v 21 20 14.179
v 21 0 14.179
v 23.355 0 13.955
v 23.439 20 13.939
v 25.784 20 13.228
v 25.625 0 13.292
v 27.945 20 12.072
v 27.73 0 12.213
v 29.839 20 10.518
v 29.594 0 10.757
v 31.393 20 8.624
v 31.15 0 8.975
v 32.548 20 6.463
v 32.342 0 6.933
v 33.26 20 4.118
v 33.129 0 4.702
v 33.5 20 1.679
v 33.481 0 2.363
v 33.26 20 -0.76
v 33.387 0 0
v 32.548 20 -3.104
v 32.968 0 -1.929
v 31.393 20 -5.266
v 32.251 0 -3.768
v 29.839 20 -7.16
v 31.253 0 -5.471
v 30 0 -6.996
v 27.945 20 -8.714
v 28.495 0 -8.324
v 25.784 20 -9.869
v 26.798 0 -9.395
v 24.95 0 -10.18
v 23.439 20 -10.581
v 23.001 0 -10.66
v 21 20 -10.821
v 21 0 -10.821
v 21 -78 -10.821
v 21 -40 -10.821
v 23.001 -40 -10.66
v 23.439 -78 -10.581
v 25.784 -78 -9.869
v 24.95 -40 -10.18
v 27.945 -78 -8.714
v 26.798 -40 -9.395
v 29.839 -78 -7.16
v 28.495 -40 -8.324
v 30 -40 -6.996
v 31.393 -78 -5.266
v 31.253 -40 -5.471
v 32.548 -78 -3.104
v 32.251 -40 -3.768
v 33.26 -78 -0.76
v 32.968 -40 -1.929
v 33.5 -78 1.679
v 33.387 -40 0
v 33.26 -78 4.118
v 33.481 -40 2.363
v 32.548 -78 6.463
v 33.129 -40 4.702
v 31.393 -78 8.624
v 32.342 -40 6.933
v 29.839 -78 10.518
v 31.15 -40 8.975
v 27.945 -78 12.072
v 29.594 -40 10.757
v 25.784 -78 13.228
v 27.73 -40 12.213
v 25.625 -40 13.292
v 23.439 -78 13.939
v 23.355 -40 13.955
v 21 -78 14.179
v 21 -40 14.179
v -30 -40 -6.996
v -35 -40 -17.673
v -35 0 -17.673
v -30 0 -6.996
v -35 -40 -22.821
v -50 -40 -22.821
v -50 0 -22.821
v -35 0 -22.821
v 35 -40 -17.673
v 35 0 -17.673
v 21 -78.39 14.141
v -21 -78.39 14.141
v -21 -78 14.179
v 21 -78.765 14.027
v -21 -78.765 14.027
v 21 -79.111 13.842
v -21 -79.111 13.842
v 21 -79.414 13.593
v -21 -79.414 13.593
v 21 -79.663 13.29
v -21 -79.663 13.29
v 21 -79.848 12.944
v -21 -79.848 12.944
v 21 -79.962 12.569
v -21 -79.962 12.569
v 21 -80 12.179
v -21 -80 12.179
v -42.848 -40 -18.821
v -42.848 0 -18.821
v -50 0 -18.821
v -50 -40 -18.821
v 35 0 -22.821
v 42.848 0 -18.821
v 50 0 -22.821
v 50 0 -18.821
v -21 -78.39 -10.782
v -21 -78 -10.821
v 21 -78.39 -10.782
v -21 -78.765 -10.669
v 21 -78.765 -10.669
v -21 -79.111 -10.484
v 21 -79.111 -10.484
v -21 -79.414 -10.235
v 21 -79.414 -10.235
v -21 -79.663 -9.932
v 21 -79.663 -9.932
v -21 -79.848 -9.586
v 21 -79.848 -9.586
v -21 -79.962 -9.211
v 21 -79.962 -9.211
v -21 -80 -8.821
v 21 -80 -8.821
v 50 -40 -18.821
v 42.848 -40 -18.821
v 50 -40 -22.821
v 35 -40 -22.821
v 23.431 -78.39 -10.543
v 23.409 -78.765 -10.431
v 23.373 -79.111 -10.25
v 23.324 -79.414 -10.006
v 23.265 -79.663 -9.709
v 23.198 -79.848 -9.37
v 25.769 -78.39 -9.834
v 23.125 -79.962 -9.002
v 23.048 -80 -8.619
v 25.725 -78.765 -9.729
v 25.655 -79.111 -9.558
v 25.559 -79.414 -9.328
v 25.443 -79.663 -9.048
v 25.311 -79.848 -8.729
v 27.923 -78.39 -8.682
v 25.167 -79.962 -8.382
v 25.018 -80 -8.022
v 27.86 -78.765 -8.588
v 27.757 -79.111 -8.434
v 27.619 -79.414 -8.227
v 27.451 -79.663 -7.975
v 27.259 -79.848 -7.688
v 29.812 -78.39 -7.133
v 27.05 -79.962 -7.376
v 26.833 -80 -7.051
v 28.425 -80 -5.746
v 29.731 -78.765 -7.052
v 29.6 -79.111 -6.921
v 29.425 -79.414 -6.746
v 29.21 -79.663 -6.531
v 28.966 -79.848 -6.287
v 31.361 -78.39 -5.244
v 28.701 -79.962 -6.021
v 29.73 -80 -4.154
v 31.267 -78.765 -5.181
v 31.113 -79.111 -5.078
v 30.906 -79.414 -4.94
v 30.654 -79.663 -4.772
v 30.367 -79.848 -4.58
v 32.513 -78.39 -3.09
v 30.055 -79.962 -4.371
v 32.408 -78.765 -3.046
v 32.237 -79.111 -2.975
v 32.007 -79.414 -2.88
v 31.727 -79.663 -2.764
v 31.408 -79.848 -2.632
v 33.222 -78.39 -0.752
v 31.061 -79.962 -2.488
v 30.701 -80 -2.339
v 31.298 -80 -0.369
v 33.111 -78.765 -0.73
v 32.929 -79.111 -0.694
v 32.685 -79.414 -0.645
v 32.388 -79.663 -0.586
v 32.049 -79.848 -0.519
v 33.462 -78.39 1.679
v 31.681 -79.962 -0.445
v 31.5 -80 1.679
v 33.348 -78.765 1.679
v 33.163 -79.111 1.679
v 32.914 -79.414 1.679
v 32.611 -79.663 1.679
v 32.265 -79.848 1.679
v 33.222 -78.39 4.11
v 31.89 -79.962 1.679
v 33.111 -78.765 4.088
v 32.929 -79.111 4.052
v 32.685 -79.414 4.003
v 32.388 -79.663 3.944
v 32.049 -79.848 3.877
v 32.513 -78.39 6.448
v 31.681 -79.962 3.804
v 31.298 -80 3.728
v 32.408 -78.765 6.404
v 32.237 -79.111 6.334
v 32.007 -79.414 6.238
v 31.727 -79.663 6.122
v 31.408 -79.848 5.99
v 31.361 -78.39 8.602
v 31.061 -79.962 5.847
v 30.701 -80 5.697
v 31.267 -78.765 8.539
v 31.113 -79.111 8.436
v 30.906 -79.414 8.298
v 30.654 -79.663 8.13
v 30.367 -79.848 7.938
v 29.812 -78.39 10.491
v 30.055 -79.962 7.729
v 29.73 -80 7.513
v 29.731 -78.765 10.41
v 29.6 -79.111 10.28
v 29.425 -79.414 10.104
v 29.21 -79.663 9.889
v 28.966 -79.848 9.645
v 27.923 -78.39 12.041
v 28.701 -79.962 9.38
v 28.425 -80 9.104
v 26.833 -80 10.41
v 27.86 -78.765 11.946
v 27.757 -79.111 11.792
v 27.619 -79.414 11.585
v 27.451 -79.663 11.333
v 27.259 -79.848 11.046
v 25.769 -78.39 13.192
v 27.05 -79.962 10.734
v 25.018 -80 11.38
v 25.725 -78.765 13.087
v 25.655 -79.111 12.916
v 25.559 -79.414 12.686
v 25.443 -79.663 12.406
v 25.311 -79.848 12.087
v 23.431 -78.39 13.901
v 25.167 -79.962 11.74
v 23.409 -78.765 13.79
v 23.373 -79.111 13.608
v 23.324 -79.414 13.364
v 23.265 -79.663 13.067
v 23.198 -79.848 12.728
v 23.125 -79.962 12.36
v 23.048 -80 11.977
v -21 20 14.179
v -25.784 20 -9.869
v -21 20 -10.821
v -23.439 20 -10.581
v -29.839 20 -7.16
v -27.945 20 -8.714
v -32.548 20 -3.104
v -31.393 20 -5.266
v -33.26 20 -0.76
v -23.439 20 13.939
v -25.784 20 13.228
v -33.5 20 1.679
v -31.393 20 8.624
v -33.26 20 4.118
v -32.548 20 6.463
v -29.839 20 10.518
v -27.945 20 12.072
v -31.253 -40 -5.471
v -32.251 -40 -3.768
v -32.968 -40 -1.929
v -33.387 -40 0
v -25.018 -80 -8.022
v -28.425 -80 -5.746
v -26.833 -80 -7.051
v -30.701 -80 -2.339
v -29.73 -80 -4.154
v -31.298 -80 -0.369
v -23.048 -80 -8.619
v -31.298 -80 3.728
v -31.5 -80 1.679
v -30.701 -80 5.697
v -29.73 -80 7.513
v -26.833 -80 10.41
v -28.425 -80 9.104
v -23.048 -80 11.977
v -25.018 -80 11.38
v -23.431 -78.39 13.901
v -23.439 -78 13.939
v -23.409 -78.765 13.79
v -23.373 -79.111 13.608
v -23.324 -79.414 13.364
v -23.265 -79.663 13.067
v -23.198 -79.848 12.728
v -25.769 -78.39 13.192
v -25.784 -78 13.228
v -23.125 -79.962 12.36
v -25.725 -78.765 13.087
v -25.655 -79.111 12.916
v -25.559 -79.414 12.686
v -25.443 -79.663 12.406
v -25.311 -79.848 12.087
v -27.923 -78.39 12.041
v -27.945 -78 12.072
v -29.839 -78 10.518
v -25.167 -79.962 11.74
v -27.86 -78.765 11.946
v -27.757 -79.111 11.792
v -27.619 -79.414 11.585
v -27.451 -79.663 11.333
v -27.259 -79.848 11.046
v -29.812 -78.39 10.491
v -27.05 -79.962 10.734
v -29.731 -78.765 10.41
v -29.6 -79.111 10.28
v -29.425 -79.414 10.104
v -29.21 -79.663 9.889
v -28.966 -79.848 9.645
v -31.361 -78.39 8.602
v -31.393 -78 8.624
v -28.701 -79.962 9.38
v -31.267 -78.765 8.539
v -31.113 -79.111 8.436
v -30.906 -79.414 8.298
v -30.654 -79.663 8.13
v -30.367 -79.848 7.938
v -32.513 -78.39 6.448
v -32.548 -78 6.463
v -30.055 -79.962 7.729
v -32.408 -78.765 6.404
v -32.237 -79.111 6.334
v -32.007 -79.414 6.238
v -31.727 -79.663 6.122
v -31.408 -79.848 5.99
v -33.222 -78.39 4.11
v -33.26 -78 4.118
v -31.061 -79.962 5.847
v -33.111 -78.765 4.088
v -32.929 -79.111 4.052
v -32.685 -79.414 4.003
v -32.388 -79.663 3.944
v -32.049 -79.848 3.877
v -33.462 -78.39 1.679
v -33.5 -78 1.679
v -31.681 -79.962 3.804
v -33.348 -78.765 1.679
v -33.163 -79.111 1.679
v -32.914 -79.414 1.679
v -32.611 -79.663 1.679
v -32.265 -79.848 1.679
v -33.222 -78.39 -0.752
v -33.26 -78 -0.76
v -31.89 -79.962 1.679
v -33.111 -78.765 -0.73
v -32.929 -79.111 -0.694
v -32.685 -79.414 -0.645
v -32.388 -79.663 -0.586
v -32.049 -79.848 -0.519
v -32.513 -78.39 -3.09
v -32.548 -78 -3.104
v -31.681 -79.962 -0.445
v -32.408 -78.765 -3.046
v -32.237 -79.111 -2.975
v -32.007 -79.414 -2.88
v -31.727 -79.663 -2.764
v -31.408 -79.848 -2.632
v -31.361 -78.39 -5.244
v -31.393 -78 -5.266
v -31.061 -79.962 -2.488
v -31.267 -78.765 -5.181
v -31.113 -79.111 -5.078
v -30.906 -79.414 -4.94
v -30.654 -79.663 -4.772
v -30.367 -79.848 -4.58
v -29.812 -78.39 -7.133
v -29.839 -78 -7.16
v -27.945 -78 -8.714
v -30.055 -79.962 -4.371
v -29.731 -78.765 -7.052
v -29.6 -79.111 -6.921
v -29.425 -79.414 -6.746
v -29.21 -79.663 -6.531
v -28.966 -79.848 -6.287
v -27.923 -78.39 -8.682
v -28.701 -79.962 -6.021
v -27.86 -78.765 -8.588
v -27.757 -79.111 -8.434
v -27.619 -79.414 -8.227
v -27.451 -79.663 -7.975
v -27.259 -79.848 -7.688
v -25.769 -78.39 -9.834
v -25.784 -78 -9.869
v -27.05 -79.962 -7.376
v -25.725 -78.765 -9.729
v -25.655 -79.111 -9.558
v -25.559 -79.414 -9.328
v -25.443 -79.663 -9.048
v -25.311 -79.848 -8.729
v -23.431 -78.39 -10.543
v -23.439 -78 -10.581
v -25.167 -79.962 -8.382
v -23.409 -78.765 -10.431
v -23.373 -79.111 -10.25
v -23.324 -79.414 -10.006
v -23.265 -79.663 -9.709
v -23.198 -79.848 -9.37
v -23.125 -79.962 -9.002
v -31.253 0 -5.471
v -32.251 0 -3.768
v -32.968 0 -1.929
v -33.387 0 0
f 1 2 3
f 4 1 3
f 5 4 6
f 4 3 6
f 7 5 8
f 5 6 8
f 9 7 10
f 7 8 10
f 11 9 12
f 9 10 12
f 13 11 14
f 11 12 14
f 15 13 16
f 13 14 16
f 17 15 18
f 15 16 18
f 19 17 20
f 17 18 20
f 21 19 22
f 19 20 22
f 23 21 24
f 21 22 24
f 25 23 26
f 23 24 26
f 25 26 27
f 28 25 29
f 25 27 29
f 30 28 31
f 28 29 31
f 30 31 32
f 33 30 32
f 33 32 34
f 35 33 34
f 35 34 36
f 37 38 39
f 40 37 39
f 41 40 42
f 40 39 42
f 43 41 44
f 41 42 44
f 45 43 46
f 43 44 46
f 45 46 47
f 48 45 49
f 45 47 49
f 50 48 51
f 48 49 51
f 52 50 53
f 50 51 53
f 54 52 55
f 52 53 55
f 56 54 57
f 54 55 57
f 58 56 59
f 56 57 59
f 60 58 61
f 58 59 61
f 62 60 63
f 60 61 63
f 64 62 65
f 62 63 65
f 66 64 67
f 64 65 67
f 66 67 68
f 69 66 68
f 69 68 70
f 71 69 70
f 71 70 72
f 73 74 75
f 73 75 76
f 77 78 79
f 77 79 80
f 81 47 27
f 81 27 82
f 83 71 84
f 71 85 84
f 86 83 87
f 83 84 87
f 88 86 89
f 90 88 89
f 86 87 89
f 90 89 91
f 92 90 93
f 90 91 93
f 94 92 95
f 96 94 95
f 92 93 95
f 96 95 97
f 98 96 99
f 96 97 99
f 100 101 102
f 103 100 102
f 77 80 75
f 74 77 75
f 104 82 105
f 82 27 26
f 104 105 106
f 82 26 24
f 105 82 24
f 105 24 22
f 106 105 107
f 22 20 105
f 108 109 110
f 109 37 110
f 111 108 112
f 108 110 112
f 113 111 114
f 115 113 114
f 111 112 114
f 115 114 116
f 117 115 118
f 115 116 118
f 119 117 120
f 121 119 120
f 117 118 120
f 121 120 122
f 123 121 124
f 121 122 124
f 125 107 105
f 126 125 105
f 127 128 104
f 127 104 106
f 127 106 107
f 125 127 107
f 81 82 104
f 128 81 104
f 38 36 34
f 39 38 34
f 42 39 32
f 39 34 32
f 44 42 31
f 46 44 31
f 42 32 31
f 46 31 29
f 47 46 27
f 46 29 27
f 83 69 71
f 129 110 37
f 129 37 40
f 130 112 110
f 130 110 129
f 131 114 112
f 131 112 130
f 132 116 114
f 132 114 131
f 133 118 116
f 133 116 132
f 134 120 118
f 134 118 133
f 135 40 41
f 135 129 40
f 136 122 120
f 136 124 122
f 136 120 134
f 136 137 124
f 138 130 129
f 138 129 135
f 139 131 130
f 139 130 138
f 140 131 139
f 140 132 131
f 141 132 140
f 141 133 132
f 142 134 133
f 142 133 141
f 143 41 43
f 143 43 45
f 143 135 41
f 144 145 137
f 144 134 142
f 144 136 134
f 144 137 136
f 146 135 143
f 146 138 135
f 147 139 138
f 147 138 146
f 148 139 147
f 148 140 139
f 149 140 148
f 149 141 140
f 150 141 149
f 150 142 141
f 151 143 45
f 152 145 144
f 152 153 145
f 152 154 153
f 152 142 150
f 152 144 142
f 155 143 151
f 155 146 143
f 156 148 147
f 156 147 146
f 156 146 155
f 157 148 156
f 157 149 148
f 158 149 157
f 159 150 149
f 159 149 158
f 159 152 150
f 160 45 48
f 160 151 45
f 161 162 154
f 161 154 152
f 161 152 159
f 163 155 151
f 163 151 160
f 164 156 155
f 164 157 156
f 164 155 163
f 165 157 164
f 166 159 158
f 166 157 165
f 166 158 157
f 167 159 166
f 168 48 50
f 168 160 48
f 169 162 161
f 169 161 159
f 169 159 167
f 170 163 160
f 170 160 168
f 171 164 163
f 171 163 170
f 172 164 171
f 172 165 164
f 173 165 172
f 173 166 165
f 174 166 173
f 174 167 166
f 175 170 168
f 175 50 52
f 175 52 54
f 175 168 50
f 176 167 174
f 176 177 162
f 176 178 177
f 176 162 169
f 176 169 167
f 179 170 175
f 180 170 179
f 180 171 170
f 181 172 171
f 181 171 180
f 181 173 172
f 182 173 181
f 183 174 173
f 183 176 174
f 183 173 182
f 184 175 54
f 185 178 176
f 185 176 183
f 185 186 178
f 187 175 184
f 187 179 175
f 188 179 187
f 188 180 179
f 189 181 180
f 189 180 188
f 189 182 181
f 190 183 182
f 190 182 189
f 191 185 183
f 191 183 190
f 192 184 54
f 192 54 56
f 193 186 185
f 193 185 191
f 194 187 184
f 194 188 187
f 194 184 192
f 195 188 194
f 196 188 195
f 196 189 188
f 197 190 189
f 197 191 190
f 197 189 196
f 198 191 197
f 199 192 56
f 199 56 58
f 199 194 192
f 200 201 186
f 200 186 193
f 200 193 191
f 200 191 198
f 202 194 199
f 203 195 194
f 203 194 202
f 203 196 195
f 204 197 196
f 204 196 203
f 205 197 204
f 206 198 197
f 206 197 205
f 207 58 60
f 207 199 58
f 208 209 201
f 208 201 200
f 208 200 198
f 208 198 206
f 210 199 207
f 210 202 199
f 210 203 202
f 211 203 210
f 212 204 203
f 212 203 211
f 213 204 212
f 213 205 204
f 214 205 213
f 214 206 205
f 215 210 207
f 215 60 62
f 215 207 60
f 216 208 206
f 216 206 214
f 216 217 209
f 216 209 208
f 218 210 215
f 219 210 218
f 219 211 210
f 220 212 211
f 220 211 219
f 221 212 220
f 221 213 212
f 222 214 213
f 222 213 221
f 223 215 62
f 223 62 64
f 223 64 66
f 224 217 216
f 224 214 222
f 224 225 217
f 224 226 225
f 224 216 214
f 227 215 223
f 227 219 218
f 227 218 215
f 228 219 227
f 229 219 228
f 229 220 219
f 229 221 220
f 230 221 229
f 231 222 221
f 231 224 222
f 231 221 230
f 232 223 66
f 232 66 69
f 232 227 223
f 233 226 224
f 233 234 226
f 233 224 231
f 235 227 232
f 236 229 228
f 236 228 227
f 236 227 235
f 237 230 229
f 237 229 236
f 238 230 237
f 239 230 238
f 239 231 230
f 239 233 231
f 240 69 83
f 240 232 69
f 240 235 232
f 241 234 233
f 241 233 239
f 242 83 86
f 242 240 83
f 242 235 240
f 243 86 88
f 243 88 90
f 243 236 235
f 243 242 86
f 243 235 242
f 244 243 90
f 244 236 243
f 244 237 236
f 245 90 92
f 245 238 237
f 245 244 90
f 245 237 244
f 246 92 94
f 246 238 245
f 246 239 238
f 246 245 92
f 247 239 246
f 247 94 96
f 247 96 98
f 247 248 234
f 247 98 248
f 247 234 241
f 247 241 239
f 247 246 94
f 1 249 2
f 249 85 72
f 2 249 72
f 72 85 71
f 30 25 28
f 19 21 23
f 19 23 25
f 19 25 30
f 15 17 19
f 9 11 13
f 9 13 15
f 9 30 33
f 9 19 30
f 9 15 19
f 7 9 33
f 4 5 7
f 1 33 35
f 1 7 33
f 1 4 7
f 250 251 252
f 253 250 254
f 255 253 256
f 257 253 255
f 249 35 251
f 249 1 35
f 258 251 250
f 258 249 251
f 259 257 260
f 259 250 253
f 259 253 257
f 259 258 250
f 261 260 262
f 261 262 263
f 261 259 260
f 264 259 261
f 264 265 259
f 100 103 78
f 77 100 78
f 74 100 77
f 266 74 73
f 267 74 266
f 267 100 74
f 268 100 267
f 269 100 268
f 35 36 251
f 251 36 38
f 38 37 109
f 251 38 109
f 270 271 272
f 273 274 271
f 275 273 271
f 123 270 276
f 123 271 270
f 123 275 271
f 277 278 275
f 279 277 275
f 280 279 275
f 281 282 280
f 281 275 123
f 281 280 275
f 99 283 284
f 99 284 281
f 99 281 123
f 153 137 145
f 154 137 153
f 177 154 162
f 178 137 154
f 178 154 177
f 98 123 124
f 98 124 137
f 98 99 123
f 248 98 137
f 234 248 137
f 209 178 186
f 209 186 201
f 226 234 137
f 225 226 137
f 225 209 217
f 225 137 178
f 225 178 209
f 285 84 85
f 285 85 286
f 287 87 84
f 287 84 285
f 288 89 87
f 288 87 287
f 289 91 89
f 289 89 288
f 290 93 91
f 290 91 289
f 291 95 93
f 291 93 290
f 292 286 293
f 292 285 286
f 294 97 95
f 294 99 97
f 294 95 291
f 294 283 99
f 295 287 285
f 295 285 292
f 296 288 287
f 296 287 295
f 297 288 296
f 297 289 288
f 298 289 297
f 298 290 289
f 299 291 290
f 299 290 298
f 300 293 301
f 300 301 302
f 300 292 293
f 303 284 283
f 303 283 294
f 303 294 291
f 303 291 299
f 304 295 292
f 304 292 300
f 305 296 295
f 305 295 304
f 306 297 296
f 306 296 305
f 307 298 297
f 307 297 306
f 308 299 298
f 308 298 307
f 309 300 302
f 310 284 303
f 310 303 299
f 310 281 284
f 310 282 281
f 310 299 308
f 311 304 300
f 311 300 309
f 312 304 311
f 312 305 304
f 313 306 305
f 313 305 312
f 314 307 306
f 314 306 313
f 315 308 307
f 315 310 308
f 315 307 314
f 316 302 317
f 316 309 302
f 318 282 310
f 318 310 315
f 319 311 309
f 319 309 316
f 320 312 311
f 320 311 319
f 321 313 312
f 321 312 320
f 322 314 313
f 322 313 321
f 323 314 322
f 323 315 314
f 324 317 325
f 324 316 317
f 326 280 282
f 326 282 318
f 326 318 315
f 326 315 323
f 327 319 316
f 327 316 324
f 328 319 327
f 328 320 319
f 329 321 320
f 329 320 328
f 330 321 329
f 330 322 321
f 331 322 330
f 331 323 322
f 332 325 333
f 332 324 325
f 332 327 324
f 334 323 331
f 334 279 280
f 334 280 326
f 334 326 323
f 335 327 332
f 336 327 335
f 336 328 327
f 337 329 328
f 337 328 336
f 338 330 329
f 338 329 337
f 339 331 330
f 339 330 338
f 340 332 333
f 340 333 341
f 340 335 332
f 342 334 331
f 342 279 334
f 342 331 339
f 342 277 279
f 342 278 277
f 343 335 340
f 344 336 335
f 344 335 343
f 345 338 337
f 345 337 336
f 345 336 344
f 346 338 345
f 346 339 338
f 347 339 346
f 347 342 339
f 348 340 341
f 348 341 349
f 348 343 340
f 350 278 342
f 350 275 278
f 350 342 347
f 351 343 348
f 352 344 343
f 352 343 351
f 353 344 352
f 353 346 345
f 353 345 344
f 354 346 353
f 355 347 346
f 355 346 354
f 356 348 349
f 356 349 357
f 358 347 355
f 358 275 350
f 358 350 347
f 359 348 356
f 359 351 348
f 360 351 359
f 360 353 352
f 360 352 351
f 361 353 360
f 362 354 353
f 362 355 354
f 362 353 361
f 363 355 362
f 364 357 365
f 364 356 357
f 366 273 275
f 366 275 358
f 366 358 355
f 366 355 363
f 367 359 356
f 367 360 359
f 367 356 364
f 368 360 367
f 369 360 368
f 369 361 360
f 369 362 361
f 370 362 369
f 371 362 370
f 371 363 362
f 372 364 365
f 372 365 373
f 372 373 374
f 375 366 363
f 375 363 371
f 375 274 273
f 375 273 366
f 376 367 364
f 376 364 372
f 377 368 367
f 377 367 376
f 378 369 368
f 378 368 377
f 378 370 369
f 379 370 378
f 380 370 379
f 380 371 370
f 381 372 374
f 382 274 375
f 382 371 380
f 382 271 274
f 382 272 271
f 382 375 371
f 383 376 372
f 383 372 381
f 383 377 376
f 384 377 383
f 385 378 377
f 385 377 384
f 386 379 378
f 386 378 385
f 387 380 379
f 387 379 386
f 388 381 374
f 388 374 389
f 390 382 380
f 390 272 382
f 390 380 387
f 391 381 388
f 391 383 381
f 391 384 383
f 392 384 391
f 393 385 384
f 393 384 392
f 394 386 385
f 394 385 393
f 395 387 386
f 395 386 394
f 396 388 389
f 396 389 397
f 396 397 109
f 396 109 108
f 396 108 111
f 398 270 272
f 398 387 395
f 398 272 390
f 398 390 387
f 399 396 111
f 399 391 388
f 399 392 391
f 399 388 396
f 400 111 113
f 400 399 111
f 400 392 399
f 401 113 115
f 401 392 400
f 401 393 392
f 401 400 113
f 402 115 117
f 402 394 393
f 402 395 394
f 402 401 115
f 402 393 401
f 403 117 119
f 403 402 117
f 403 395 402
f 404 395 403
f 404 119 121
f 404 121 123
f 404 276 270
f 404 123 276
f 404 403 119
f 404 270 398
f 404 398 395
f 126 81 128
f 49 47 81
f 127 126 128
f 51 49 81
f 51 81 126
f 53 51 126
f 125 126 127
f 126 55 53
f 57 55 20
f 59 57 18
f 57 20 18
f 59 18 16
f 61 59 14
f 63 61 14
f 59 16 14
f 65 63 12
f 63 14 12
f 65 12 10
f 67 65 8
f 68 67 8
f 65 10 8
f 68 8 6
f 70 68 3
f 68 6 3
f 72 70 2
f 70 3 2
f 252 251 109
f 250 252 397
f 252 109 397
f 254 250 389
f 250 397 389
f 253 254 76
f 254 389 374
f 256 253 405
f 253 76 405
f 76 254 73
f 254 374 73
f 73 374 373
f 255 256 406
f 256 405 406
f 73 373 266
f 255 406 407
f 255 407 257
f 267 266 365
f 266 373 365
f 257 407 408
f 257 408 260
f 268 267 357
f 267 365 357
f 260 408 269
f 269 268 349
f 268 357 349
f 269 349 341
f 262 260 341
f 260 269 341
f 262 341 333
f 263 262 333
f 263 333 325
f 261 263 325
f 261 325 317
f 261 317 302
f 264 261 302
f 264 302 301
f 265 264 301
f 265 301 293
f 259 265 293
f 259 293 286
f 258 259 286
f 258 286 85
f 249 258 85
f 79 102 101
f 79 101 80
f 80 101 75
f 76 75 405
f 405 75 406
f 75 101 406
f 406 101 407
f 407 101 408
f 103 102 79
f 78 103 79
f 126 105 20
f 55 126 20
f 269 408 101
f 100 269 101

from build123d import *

# Parameters (mm, degrees)
F1_DEPTH = 40
F3_DEPTH = 40
F5_DEPTH = 20
F6_R     = 2


with BuildPart() as f1:
    # F0 (on Front) → F1 (new body)
    with BuildSketch(Plane.XZ):
        with BuildLine():
            Line((-21, -10.8208951545), (0, -10.8208951545))
            Line((0, -10.8208951545), (21, -10.8208951545))
            ThreePointArc((21, -10.8208951545), (25.8896090165, -9.8248824487), (30, -6.9955709409))
            ThreePointArc((30, -6.9955709409), (32.2508823643, -3.7676966034), (33.3867108999, 0))
            ThreePointArc((33.3867108999, 0), (30.4137880412, 9.9028871089), (21, 14.1791048455))
            Line((21, 14.1791048455), (0, 14.1791048455))
            Line((0, 14.1791048455), (-21, 14.1791048455))
            ThreePointArc((-21, 14.1791048455), (-30.4137880412, 9.9028871089), (-33.3867108999, 0))
            ThreePointArc((-33.3867108999, 0), (-32.2508823643, -3.7676966034), (-30, -6.9955709409))
            ThreePointArc((-30, -6.9955709409), (-25.8896090165, -9.8248824487), (-21, -10.8208951545))
        make_face()
        with BuildLine():
            ThreePointArc((33.3867108999, 0), (32.2508823643, -3.7676966034), (30, -6.9955709409))
            Line((30, -6.9955709409), (35, -17.6733862609))
            Line((35, -17.6733862609), (35, -22.8208951545))
            Line((35, -22.8208951545), (50, -22.8208951545))
            Line((50, -22.8208951545), (50, -18.8208951545))
            Line((50, -18.8208951545), (42.8475700319, -18.8208951545))
            Line((42.8475700319, -18.8208951545), (33.3867108999, 0))
        make_face()
        with BuildLine():
            Line((-35, -17.6733862609), (-30, -6.9955709409))
            ThreePointArc((-30, -6.9955709409), (-32.2508823643, -3.7676966034), (-33.3867108999, 0))
            Line((-33.3867108999, 0), (-42.8475700319, -18.8208951545))
            Line((-42.8475700319, -18.8208951545), (-50, -18.8208951545))
            Line((-50, -18.8208951545), (-50, -22.8208951545))
            Line((-50, -22.8208951545), (-35, -22.8208951545))
            Line((-35, -22.8208951545), (-35, -17.6733862609))
        make_face()
    extrude(amount=F1_DEPTH)

    # F2 (on face) → F3 (join)
    with BuildSketch(Plane.XZ.offset(40)):
        with BuildLine():
            Line((21, 14.1791048455), (-21, 14.1791048455))
            ThreePointArc((-21, 14.1791048455), (-33.5, 1.6791048455), (-21, -10.8208951545))
            Line((-21, -10.8208951545), (21, -10.8208951545))
            ThreePointArc((21, -10.8208951545), (33.5, 1.6791048455), (21, 14.1791048455))
        make_face()
    extrude(amount=F3_DEPTH)

    # F4 (on face) + F2 (on face) → F5 (join)
    with BuildSketch(Plane(origin=(0, 0, 0), x_dir=(-1, 0, 0), z_dir=(0, 1, 0))):
        with BuildLine():
            Line((-21, -10.8208951545), (21, -10.8208951545))
            ThreePointArc((21, -10.8208951545), (33.5, 1.6791048455), (21, 14.1791048455))
            Line((21, 14.1791048455), (-21, 14.1791048455))
            ThreePointArc((-21, 14.1791048455), (-33.5, 1.6791048455), (-21, -10.8208951545))
        make_face()
    with BuildSketch(Plane.XZ.offset(40)):
        with BuildLine():
            Line((21, 14.1791048455), (-21, 14.1791048455))
            ThreePointArc((-21, 14.1791048455), (-33.5, 1.6791048455), (-21, -10.8208951545))
            Line((-21, -10.8208951545), (21, -10.8208951545))
            ThreePointArc((21, -10.8208951545), (33.5, 1.6791048455), (21, 14.1791048455))
        make_face()
    extrude(amount=F5_DEPTH, dir=(0, 1, 0))

    # F6
    f6_edges = [f1.edges().sort_by_distance(p)[0] for p in [
        (0, -80, 14.179105),
        (33.5, -80, 1.679105),
        (0, -80, -10.820895),
        (-33.5, -80, 1.679105),
    ]]
    fillet(f6_edges, radius=F6_R)


solid = f1.part
